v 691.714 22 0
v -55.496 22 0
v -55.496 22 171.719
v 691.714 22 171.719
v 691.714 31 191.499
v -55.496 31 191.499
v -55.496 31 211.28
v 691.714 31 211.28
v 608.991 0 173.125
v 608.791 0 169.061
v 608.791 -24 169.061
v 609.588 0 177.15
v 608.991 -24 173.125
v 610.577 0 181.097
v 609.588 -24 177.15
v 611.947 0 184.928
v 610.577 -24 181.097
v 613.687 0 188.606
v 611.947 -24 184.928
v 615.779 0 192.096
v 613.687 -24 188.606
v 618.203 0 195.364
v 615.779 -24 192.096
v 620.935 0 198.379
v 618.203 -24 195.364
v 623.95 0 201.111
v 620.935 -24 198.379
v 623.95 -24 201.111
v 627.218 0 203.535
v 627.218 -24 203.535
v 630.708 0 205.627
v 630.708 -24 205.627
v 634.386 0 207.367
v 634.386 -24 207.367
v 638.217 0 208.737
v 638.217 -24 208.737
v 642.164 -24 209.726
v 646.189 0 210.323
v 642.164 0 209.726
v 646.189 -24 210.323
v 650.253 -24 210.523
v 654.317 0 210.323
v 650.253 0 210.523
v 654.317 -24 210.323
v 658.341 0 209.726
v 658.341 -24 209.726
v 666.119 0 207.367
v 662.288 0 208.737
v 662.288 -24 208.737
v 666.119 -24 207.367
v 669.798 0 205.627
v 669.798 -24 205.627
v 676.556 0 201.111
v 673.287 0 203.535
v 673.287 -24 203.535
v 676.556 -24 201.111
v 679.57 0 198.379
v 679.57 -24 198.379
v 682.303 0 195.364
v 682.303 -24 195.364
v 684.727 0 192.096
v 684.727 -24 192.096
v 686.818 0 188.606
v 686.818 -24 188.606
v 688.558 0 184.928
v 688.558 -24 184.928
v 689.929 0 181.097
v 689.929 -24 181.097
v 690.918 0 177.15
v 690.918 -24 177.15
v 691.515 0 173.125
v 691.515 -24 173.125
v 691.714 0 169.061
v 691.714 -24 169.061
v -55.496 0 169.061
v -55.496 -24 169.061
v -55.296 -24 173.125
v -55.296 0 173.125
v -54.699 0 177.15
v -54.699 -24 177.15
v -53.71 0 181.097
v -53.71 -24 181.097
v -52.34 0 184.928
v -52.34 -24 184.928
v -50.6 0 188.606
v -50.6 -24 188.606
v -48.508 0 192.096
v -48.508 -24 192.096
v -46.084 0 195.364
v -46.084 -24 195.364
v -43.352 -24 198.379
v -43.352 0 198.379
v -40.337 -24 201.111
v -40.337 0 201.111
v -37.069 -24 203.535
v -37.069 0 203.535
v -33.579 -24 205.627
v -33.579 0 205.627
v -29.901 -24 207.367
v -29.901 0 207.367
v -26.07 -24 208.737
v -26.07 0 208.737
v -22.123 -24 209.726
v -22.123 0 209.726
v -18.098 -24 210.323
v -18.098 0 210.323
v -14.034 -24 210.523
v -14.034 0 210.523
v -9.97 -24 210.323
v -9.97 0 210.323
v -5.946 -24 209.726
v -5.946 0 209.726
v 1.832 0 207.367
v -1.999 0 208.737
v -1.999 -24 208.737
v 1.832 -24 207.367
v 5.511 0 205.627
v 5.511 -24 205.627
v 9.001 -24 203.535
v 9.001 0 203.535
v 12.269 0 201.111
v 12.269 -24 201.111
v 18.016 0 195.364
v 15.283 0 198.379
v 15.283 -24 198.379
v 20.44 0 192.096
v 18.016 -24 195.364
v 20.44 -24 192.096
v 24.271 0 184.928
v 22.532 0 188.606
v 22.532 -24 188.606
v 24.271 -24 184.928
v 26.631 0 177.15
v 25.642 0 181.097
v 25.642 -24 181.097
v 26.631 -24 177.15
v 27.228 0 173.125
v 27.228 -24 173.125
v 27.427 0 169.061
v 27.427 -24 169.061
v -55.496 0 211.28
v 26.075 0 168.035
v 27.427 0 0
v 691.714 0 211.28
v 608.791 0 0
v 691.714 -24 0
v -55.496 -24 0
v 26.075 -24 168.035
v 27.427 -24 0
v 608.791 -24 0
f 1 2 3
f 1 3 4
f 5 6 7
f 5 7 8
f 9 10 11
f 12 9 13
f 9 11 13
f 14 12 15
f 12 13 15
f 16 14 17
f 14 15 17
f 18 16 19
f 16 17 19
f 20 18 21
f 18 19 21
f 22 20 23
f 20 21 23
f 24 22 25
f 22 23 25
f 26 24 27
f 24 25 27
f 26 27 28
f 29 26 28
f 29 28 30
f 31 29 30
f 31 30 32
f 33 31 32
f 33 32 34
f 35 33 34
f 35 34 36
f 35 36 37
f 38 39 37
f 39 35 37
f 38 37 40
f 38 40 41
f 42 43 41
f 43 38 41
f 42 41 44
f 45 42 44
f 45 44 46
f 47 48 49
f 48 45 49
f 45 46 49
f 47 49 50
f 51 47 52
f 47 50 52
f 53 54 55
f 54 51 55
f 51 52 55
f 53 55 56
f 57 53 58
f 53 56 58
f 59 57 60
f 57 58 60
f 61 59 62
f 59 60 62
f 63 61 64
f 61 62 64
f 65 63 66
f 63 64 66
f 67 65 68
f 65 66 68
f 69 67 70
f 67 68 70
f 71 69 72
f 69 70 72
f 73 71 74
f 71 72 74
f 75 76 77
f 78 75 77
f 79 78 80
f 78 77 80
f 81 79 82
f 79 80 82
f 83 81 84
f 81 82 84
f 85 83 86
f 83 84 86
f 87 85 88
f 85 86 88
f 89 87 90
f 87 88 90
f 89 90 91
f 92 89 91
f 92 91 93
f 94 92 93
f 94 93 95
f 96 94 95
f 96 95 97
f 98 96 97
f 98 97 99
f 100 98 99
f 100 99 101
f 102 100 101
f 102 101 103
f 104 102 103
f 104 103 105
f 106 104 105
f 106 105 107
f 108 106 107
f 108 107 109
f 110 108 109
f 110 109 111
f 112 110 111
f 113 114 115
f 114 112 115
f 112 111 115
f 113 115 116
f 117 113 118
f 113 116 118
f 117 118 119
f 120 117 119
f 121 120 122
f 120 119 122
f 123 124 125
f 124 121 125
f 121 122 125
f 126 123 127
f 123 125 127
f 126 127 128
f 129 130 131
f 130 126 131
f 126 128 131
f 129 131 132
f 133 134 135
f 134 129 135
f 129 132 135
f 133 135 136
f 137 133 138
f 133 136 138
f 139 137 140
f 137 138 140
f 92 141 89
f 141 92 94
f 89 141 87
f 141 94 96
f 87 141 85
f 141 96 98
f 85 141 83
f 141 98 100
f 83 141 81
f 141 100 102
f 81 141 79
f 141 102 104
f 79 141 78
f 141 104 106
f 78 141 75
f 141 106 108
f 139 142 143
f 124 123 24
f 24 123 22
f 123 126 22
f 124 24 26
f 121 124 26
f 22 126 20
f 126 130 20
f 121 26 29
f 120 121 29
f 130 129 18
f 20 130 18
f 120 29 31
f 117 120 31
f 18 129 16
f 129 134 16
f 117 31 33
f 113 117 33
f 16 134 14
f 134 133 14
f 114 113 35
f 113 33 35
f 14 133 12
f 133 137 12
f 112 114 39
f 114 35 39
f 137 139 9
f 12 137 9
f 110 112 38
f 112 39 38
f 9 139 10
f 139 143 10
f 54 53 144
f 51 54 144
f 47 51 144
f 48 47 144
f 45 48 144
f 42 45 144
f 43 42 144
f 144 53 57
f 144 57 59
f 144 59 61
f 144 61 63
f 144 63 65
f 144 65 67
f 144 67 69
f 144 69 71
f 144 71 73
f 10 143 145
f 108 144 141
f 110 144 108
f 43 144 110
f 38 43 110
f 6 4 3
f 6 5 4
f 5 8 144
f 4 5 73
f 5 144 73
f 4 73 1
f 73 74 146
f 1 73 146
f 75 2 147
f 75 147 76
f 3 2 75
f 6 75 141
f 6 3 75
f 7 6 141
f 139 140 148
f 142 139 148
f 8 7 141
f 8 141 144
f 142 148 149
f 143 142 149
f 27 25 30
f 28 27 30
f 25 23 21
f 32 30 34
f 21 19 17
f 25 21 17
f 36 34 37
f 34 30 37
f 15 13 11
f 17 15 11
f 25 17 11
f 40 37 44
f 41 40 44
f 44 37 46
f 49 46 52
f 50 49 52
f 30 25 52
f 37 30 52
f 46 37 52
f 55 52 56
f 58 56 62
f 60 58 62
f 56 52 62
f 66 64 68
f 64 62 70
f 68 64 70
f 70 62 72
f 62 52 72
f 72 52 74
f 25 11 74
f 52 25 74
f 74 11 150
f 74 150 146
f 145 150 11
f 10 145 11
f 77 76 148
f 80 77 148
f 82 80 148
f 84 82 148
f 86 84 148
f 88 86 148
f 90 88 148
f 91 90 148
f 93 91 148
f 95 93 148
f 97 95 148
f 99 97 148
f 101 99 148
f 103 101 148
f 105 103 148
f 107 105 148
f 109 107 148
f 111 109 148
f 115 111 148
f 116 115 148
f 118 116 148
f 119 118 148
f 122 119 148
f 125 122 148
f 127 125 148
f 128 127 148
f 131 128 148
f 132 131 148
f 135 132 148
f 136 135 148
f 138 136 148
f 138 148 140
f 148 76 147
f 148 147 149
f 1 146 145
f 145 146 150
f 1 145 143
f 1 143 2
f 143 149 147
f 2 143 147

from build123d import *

# Parameters (mm, degrees)
CROQUIS1_W              = 747.21
CROQUIS1_H              = 211.28
SALIENTE_EXTRUIR1_DEPTH = 22
SALIENTE_EXTRUIR6_DEPTH = 39


with BuildPart() as part:
    # Croquis1 → Saliente-Extruir1 (new body)
    with BuildSketch(Plane(origin=(0, 0, 0), x_dir=(1, 0, 0), z_dir=(0, 1, 0))):
        with Locations((318.109210015, -105.64)):
            Rectangle(CROQUIS1_W, CROQUIS1_H)
    extrude(amount=SALIENTE_EXTRUIR1_DEPTH)

    # Croquis2 → Recubrir1 section 0
    with BuildSketch(Plane(origin=(0, 22, 0), x_dir=(1, 0, 0), z_dir=(0, 1, 0))):
        with BuildLine():
            Line((-55.495789985, -171.71895061), (-55.495789985, -211.28))
            Line((-55.495789985, -211.28), (691.714210015, -211.28))
            Line((691.714210015, -211.28), (691.714210015, -171.71895061))
            Line((691.714210015, -171.71895061), (-55.495789985, -171.71895061))
        make_face()
    # Croquis3 → Recubrir1 section 1
    with BuildSketch(Plane(origin=(0, 31, 0), x_dir=(1, 0, 0), z_dir=(0, 1, 0))):
        with BuildLine():
            Line((-55.495789985, -211.28), (-55.495789985, -191.499475305))
            Line((-55.495789985, -191.499475305), (691.714210015, -191.499475305))
            Line((691.714210015, -191.499475305), (691.714210015, -211.28))
            Line((691.714210015, -211.28), (-55.495789985, -211.28))
        make_face()
    loft()

    # Croquis4 → Saliente-Extruir6 (add)
    with BuildSketch(Plane(origin=(0, -24, 0), x_dir=(-1, 0, 0), z_dir=(0, -1, 0))):
        with BuildLine():
            Line((-691.714210015, 0), (-608.79118576, 0))
            Line((-608.79118576, 0), (-608.79118576, -169.061248366))
            ThreePointArc((-608.79118576, -169.061248366), (-650.252697887, -210.522760493), (-691.714210015, -169.061248366))
            Line((-691.714210015, -169.061248366), (-691.714210015, 0))
        make_face()
        with BuildLine():
            Line((55.495789985, 0), (55.495789985, -169.06124837))
            ThreePointArc((55.495789985, -169.06124837), (14.034277855, -210.5227605), (-27.427234275, -169.06124837))
            Line((-27.427234275, -169.06124837), (-26.075334487, -168.034902921))
            Line((-26.075334487, -168.034902921), (-27.427234275, 0))
            Line((-27.427234275, 0), (55.495789985, 0))
        make_face()
    extrude(amount=-SALIENTE_EXTRUIR6_DEPTH)


solid = part.part
